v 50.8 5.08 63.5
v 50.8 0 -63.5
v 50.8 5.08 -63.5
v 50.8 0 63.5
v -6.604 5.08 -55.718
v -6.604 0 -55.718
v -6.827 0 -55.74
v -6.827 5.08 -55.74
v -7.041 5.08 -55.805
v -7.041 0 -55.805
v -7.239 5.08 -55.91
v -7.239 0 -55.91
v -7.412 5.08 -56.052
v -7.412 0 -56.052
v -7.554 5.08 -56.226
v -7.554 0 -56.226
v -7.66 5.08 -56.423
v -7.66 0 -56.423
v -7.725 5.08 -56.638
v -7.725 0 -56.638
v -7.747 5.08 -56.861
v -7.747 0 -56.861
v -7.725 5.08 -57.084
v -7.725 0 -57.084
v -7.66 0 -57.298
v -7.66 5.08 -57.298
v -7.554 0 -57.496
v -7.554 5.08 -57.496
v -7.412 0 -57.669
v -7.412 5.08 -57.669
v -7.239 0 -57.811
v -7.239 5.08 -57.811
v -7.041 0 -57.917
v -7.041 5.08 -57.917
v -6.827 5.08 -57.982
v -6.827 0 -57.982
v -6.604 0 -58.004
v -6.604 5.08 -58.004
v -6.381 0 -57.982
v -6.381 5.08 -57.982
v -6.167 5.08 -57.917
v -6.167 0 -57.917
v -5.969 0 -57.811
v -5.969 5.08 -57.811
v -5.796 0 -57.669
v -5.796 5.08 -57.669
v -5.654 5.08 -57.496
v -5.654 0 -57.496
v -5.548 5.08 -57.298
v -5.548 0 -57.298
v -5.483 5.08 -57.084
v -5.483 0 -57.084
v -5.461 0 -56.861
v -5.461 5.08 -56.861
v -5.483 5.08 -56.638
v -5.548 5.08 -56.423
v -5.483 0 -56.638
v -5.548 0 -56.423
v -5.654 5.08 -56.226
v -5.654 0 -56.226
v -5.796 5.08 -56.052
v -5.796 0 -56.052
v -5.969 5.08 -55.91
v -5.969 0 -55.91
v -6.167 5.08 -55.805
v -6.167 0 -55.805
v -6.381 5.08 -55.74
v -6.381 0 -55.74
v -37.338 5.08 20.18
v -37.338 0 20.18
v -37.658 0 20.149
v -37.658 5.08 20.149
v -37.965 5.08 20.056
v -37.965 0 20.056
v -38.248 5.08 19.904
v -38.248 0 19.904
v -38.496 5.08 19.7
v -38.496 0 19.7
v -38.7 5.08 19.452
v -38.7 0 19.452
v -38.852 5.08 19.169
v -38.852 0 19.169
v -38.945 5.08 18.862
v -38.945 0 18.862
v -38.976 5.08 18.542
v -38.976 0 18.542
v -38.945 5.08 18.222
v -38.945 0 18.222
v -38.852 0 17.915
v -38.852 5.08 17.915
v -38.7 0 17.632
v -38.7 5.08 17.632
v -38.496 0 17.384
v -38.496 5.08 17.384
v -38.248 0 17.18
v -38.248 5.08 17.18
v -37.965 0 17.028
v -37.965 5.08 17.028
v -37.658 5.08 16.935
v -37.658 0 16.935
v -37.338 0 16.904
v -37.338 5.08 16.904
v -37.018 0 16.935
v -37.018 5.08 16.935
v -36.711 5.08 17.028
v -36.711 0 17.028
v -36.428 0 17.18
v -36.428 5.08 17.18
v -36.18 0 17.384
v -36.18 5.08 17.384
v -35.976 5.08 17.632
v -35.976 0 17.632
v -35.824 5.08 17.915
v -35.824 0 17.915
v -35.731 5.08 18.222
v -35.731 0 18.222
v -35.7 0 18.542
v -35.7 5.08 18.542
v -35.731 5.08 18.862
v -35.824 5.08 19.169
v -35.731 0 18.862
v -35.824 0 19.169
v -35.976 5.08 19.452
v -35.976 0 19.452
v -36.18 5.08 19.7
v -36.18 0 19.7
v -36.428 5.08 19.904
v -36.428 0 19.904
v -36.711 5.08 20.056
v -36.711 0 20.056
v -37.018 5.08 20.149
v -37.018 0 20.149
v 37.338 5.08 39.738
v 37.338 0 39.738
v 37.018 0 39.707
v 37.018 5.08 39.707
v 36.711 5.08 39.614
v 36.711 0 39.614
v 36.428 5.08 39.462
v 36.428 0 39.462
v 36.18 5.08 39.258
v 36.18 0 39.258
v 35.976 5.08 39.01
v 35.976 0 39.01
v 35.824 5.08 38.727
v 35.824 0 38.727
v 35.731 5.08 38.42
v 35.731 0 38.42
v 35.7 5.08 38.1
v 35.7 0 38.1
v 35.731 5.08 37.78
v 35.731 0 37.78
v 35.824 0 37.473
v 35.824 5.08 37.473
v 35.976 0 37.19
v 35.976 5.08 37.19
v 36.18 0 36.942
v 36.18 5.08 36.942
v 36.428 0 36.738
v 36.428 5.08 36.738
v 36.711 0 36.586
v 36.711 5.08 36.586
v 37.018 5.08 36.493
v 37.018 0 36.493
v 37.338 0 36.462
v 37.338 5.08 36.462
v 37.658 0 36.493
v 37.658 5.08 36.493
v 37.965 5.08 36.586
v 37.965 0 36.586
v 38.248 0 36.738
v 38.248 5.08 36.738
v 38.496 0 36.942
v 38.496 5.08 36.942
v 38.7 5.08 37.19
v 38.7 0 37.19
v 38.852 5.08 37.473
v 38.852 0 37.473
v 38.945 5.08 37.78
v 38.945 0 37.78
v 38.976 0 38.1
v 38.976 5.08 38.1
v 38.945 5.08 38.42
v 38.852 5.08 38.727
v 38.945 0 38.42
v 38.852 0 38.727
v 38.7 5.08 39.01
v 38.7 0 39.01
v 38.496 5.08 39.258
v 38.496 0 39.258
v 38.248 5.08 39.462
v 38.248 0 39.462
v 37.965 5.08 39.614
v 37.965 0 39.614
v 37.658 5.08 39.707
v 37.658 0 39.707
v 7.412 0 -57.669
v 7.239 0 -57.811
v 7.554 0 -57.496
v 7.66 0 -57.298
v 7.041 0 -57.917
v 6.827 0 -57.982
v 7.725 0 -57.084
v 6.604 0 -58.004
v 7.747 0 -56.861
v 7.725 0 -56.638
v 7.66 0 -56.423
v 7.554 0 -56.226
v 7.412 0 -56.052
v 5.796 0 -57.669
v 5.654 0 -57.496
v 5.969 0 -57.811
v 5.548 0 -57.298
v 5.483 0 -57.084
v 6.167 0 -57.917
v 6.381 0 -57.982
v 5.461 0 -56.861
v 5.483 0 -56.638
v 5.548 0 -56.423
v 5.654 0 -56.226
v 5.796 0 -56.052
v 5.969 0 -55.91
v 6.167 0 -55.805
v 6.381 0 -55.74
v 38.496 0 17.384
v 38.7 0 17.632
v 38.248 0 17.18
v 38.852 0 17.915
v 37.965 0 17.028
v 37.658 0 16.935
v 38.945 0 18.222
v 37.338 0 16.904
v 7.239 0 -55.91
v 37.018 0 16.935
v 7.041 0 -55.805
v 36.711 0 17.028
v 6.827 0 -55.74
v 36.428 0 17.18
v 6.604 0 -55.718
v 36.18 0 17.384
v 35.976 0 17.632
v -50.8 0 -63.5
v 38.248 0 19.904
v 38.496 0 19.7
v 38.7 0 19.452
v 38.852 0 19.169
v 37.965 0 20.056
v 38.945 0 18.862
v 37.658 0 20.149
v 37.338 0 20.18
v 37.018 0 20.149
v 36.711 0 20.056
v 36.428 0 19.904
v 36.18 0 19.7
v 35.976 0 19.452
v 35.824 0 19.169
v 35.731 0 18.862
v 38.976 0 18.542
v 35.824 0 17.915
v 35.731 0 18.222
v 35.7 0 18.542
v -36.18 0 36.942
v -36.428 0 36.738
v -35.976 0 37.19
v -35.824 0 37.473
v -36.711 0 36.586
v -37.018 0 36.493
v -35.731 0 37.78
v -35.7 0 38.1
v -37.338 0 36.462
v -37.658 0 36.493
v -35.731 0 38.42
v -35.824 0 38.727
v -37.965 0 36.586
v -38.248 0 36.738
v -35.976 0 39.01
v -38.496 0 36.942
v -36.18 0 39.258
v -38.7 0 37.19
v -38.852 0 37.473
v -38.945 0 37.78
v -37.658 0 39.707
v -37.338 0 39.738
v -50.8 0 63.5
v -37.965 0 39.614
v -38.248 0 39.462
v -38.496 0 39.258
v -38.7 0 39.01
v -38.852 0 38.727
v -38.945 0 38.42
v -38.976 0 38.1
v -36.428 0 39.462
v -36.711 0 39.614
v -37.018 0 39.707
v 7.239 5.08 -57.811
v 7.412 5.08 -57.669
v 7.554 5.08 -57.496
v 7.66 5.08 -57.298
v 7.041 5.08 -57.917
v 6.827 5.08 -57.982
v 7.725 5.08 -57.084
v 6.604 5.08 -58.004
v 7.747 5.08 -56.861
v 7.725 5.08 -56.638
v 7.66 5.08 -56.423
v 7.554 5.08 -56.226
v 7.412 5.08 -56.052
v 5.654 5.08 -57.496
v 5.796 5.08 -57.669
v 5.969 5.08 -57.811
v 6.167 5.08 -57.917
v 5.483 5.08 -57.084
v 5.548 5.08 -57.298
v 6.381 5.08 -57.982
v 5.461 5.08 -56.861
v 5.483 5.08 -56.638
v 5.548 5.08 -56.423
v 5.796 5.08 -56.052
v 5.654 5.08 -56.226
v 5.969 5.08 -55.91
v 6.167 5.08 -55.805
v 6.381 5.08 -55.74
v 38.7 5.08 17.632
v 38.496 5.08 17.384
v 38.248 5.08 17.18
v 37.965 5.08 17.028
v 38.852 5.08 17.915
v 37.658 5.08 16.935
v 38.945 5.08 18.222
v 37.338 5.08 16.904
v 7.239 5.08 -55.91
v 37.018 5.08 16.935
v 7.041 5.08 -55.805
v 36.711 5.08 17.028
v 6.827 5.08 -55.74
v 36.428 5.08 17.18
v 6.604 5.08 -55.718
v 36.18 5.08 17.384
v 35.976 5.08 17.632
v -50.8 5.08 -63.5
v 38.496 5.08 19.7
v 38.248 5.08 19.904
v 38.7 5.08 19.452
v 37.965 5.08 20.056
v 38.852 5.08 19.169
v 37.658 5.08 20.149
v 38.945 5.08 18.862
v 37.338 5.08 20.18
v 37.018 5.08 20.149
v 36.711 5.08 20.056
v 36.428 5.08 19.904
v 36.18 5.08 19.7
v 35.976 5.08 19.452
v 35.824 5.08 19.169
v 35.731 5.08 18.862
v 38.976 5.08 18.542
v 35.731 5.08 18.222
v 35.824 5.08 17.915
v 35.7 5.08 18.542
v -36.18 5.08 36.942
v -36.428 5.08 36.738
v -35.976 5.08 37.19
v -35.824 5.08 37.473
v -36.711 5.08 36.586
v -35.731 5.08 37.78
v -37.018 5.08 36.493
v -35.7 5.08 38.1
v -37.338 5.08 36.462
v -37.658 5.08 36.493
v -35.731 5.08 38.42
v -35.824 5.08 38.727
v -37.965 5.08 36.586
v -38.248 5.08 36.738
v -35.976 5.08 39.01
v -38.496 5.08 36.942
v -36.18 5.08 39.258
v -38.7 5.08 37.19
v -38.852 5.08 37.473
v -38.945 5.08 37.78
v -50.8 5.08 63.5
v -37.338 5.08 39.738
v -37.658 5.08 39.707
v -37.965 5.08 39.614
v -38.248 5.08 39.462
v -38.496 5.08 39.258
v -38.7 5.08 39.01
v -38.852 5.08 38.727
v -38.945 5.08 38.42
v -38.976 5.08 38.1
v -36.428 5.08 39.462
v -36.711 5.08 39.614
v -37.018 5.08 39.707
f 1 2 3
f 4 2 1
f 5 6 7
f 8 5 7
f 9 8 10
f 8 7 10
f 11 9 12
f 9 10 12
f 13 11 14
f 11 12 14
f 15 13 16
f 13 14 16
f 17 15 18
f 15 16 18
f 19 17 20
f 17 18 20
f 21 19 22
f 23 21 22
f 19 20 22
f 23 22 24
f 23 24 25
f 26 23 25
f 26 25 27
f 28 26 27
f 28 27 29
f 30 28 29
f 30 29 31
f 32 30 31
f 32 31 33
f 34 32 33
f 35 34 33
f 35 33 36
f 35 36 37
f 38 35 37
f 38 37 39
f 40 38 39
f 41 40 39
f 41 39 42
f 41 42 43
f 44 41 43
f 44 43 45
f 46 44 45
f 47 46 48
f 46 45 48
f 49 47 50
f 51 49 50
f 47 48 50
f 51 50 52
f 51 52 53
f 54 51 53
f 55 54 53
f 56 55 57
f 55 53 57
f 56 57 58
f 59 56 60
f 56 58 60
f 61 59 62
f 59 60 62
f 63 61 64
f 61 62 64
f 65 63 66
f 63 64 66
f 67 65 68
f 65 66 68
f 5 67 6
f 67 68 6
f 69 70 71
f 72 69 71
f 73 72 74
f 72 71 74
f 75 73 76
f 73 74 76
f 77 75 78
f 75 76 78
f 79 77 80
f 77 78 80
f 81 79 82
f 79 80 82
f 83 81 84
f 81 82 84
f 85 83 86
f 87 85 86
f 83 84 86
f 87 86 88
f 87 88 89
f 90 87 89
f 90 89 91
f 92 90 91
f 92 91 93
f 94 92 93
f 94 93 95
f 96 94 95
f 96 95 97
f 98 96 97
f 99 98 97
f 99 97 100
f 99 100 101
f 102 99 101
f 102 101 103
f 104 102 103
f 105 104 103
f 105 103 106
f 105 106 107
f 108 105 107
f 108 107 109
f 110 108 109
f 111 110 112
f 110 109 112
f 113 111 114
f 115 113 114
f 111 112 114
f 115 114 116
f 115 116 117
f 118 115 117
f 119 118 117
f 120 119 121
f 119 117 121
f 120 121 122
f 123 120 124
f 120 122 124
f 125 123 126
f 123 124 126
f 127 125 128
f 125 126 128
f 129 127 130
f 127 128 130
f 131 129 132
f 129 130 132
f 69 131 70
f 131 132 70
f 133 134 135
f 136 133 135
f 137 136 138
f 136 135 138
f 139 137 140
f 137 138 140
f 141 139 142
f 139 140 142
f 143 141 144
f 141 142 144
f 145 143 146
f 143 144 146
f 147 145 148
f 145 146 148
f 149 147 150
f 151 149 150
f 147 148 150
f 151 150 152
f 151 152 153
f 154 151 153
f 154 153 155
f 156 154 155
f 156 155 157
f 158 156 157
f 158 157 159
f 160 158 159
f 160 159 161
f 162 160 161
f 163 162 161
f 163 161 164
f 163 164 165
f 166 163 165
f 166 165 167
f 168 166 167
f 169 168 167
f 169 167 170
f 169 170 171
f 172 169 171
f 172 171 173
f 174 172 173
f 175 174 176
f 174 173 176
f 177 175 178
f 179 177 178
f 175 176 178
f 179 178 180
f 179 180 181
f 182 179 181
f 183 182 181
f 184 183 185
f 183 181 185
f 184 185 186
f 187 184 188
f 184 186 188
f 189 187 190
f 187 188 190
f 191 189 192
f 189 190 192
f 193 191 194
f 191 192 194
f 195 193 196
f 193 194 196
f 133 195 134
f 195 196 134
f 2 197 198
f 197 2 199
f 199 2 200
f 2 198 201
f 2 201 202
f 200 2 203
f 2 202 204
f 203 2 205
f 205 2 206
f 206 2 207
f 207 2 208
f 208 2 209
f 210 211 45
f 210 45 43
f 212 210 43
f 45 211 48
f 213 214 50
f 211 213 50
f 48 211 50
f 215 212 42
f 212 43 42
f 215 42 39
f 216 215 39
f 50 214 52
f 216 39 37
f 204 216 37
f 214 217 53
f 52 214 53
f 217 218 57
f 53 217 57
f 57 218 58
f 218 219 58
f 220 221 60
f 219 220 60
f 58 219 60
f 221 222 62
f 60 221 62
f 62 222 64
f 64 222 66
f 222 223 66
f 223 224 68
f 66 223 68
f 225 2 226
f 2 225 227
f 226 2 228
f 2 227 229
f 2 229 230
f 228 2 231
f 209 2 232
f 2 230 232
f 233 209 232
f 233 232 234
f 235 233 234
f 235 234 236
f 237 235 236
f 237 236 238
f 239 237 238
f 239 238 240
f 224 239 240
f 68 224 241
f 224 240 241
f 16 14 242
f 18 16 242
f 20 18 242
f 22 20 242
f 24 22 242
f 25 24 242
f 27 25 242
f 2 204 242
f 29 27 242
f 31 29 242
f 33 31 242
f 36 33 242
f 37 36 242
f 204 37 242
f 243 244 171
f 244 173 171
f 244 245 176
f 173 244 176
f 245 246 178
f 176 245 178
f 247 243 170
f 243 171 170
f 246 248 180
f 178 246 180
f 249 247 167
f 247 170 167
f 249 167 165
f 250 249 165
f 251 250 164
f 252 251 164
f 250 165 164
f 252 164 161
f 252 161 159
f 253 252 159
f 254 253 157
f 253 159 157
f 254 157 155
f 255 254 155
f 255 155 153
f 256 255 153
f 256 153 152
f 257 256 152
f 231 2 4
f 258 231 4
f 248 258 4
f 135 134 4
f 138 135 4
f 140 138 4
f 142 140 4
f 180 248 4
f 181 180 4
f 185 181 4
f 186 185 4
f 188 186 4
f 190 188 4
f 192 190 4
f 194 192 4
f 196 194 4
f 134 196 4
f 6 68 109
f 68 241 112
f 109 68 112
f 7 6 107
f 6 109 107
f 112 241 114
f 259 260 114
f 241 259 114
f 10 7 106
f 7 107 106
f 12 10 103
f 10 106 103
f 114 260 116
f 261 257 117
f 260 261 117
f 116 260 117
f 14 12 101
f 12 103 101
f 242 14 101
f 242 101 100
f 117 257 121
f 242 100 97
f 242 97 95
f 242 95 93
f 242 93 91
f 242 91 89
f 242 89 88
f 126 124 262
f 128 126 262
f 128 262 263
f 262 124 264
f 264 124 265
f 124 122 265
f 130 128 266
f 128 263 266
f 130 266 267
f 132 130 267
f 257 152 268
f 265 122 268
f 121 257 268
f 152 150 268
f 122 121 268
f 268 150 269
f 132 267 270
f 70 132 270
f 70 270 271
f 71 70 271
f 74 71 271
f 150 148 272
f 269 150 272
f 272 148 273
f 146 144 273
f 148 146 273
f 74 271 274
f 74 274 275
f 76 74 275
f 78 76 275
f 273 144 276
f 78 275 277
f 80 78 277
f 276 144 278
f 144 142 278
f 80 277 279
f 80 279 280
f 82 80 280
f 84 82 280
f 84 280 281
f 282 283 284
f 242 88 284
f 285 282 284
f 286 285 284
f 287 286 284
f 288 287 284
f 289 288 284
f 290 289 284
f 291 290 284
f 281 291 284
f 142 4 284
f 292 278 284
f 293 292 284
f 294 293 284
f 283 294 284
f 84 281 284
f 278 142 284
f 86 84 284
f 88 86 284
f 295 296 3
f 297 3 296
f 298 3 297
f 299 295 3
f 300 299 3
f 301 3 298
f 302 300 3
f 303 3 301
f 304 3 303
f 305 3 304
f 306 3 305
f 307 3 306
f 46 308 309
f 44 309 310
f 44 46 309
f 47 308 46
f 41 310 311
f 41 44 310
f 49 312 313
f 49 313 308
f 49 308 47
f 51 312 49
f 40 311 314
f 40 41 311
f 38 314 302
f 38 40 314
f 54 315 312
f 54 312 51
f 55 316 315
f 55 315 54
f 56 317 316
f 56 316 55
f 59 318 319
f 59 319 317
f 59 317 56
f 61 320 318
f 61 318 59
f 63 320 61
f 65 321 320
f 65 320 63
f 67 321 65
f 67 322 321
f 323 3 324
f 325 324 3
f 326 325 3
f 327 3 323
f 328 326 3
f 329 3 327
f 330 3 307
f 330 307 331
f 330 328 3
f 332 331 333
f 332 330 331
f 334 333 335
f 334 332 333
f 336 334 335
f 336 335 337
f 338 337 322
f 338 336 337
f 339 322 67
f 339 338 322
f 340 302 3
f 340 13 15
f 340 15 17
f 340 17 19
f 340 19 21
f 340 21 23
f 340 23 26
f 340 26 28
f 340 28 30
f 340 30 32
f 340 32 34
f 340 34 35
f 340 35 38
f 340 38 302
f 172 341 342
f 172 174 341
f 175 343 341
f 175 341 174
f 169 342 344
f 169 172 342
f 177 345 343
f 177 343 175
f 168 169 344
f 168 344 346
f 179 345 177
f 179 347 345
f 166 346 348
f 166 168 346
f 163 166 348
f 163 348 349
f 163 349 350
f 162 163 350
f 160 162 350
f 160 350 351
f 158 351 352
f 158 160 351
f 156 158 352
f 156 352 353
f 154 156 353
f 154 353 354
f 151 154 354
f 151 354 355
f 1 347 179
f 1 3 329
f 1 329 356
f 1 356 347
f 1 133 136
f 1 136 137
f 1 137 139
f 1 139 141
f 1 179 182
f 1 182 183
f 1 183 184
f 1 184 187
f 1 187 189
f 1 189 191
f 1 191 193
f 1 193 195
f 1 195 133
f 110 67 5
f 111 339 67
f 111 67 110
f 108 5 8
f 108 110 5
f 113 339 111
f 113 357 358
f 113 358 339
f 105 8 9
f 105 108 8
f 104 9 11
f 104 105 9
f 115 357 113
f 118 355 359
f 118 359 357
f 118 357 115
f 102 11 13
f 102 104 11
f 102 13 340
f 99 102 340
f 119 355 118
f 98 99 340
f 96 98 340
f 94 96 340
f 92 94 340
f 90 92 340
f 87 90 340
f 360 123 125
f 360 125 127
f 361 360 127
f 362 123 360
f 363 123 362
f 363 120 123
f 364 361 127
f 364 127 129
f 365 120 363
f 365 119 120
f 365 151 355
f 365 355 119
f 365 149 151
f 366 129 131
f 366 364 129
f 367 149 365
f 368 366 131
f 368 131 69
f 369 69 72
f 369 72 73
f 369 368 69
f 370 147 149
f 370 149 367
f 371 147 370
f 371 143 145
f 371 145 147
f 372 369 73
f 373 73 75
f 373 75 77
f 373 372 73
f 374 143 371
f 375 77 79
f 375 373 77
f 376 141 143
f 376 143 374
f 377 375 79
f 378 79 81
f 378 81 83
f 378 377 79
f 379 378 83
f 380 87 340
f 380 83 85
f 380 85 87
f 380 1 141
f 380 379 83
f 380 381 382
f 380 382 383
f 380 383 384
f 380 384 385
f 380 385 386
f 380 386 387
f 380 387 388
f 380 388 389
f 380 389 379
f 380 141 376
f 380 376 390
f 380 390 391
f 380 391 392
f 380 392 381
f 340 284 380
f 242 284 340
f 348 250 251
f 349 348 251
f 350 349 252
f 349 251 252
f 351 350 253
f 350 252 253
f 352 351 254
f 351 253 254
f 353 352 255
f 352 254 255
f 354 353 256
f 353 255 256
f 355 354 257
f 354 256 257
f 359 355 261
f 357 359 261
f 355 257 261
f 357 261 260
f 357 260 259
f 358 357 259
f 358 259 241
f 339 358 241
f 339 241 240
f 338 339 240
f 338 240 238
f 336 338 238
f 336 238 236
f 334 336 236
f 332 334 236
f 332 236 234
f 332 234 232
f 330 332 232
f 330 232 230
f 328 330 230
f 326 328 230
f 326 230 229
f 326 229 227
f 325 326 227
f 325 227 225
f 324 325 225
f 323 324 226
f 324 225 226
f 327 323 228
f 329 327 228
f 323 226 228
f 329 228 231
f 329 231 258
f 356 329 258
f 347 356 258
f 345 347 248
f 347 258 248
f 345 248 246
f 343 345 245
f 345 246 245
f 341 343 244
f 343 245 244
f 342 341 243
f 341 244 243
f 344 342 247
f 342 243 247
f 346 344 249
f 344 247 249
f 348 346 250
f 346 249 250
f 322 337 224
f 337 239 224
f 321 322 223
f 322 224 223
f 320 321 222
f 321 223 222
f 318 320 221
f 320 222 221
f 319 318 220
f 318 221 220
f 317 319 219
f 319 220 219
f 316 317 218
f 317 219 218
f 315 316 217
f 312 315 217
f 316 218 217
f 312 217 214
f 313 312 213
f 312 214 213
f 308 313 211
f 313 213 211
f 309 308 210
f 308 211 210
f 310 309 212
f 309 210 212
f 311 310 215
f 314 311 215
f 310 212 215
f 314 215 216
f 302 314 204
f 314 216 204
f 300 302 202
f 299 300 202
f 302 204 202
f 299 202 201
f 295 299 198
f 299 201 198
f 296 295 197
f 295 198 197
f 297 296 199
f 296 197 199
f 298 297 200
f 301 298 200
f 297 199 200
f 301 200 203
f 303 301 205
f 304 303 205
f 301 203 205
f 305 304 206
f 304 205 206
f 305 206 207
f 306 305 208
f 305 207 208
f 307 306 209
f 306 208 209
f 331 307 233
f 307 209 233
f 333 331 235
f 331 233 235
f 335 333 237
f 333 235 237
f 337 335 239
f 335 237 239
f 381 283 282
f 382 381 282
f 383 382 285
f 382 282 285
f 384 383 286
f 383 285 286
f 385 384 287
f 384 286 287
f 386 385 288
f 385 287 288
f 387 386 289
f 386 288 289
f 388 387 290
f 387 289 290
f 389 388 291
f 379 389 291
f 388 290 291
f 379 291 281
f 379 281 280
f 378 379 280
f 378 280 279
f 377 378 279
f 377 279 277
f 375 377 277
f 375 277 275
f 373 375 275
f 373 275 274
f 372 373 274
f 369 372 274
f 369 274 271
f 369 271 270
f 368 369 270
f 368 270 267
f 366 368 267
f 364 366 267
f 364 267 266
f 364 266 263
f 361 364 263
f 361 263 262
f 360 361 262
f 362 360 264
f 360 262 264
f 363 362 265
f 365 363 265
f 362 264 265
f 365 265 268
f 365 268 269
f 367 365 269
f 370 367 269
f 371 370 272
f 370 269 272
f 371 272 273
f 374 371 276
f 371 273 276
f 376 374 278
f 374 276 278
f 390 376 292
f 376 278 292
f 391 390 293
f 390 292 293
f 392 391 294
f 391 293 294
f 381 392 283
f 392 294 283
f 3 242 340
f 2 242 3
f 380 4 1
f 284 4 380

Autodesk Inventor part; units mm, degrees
ref_plane "YZ Plane" through (0, 0, 0) normal (1, 0, 0) x (0, 1, 0)
ref_plane "XZ Plane" through (0, 0, 0) normal (0, 1, 0) x (-1, 0, 0)
ref_plane "XY Plane" through (0, 0, 0) normal (0, 0, 1) x (1, 0, 0)
sketch "Sketch1" plane through (0, 0, 0) normal (0, 1, 0) x (-1, 0, 0)
  line L0 (-50.8, 63.5) -> (50.8, 63.5)
  line L1 (50.8, 63.5) -> (50.8, -63.5)
  line L2 (50.8, -63.5) -> (-50.8, -63.5)
  line L3 (-50.8, -63.5) -> (-50.8, 63.5)
  line L4 (-50.8, 63.5) -> (50.8, -63.5) construction
  line L5 (50.8, 63.5) -> (-50.8, -63.5) construction
  point P0 (0, 0)
  point P1 (0, 0)
  dimension "d0" = 101.6
  dimension "d1" = 127
extrude "Plate1" add sketch "Sketch1" along normal blind 5.08
sketch "Sketch2" plane through (0, 5.08, 0) normal (0, 1, 0) x (1, 0, 0)
  line L0 (-50.8, 63.5) -> (50.8, 63.5) construction
  line L1 (0, 63.5) -> (0, -63.5) construction
  line L2 (50.8, -63.5) -> (-50.8, -63.5) construction
  line L3 (-50.8, -63.5) -> (-50.8, 63.5) construction
  point P0 (0, 0)
  point P1 (-37.338, -38.1)
  point P2 (-37.338, -18.542)
  point P3 (37.338, -38.1)
  point P4 (37.338, -18.542)
  dimension "d5" = 19.558
  dimension "d6" = 13.462
  dimension "d14" = 25.4
hole "Hole1" at (-37.338, 5.08, 38.1) at (-37.338, 5.08, 18.542) at (37.338, 5.08, 38.1) at (37.338, 5.08, 18.542) direction (0, -1, 0) diameter 3.2766 end through all clearance for "Flat Head Machine Screw (82)" size "#4" standard "Ansi Unified Screw Threads"
sketch "Sketch3" plane through (0, 5.08, 0) normal (0, 1, 0) x (1, 0, 0)
  line L0 (0, 0) -> (0, 25.4) construction
  point P0 (-6.604, 56.8607)
  point P1 (6.604, 56.8607)
  dimension "d15" = 25.4
  dimension "d16" = 13.208
hole "Hole2" at (-6.604, 5.08, -56.8607) at (6.604, 5.08, -56.8607) direction (0, -1, 0) diameter 2.286 end through all
equation "\"d14\" = motor_placement"
equation "\"d12\" = Thickness"
equation "\"d22\" = Thickness"
equation "\"d4\" = Thickness"
equation "\"BendRadius\" = Thickness"
equation "\"BendReliefWidth\" = Thickness"
equation "\"BendReliefDepth\" = 0.5 * Thickness"
equation "\"CornerReliefSize\" = 4 * Thickness"
equation "\"MinimumRemnant\" = 2 * Thickness"
equation "\"TransitionRadius\" = BendRadius"
equation "\"JacobiRadiusSize\" = BendRadius"
equation "\"GapSize\" = Thickness"
equation "\"motor_placement\" = 25.4"
equation "\"Thickness\" = 5.08"
properties part number "pibot_baseplate" material "Polycarbonate, Clear"
